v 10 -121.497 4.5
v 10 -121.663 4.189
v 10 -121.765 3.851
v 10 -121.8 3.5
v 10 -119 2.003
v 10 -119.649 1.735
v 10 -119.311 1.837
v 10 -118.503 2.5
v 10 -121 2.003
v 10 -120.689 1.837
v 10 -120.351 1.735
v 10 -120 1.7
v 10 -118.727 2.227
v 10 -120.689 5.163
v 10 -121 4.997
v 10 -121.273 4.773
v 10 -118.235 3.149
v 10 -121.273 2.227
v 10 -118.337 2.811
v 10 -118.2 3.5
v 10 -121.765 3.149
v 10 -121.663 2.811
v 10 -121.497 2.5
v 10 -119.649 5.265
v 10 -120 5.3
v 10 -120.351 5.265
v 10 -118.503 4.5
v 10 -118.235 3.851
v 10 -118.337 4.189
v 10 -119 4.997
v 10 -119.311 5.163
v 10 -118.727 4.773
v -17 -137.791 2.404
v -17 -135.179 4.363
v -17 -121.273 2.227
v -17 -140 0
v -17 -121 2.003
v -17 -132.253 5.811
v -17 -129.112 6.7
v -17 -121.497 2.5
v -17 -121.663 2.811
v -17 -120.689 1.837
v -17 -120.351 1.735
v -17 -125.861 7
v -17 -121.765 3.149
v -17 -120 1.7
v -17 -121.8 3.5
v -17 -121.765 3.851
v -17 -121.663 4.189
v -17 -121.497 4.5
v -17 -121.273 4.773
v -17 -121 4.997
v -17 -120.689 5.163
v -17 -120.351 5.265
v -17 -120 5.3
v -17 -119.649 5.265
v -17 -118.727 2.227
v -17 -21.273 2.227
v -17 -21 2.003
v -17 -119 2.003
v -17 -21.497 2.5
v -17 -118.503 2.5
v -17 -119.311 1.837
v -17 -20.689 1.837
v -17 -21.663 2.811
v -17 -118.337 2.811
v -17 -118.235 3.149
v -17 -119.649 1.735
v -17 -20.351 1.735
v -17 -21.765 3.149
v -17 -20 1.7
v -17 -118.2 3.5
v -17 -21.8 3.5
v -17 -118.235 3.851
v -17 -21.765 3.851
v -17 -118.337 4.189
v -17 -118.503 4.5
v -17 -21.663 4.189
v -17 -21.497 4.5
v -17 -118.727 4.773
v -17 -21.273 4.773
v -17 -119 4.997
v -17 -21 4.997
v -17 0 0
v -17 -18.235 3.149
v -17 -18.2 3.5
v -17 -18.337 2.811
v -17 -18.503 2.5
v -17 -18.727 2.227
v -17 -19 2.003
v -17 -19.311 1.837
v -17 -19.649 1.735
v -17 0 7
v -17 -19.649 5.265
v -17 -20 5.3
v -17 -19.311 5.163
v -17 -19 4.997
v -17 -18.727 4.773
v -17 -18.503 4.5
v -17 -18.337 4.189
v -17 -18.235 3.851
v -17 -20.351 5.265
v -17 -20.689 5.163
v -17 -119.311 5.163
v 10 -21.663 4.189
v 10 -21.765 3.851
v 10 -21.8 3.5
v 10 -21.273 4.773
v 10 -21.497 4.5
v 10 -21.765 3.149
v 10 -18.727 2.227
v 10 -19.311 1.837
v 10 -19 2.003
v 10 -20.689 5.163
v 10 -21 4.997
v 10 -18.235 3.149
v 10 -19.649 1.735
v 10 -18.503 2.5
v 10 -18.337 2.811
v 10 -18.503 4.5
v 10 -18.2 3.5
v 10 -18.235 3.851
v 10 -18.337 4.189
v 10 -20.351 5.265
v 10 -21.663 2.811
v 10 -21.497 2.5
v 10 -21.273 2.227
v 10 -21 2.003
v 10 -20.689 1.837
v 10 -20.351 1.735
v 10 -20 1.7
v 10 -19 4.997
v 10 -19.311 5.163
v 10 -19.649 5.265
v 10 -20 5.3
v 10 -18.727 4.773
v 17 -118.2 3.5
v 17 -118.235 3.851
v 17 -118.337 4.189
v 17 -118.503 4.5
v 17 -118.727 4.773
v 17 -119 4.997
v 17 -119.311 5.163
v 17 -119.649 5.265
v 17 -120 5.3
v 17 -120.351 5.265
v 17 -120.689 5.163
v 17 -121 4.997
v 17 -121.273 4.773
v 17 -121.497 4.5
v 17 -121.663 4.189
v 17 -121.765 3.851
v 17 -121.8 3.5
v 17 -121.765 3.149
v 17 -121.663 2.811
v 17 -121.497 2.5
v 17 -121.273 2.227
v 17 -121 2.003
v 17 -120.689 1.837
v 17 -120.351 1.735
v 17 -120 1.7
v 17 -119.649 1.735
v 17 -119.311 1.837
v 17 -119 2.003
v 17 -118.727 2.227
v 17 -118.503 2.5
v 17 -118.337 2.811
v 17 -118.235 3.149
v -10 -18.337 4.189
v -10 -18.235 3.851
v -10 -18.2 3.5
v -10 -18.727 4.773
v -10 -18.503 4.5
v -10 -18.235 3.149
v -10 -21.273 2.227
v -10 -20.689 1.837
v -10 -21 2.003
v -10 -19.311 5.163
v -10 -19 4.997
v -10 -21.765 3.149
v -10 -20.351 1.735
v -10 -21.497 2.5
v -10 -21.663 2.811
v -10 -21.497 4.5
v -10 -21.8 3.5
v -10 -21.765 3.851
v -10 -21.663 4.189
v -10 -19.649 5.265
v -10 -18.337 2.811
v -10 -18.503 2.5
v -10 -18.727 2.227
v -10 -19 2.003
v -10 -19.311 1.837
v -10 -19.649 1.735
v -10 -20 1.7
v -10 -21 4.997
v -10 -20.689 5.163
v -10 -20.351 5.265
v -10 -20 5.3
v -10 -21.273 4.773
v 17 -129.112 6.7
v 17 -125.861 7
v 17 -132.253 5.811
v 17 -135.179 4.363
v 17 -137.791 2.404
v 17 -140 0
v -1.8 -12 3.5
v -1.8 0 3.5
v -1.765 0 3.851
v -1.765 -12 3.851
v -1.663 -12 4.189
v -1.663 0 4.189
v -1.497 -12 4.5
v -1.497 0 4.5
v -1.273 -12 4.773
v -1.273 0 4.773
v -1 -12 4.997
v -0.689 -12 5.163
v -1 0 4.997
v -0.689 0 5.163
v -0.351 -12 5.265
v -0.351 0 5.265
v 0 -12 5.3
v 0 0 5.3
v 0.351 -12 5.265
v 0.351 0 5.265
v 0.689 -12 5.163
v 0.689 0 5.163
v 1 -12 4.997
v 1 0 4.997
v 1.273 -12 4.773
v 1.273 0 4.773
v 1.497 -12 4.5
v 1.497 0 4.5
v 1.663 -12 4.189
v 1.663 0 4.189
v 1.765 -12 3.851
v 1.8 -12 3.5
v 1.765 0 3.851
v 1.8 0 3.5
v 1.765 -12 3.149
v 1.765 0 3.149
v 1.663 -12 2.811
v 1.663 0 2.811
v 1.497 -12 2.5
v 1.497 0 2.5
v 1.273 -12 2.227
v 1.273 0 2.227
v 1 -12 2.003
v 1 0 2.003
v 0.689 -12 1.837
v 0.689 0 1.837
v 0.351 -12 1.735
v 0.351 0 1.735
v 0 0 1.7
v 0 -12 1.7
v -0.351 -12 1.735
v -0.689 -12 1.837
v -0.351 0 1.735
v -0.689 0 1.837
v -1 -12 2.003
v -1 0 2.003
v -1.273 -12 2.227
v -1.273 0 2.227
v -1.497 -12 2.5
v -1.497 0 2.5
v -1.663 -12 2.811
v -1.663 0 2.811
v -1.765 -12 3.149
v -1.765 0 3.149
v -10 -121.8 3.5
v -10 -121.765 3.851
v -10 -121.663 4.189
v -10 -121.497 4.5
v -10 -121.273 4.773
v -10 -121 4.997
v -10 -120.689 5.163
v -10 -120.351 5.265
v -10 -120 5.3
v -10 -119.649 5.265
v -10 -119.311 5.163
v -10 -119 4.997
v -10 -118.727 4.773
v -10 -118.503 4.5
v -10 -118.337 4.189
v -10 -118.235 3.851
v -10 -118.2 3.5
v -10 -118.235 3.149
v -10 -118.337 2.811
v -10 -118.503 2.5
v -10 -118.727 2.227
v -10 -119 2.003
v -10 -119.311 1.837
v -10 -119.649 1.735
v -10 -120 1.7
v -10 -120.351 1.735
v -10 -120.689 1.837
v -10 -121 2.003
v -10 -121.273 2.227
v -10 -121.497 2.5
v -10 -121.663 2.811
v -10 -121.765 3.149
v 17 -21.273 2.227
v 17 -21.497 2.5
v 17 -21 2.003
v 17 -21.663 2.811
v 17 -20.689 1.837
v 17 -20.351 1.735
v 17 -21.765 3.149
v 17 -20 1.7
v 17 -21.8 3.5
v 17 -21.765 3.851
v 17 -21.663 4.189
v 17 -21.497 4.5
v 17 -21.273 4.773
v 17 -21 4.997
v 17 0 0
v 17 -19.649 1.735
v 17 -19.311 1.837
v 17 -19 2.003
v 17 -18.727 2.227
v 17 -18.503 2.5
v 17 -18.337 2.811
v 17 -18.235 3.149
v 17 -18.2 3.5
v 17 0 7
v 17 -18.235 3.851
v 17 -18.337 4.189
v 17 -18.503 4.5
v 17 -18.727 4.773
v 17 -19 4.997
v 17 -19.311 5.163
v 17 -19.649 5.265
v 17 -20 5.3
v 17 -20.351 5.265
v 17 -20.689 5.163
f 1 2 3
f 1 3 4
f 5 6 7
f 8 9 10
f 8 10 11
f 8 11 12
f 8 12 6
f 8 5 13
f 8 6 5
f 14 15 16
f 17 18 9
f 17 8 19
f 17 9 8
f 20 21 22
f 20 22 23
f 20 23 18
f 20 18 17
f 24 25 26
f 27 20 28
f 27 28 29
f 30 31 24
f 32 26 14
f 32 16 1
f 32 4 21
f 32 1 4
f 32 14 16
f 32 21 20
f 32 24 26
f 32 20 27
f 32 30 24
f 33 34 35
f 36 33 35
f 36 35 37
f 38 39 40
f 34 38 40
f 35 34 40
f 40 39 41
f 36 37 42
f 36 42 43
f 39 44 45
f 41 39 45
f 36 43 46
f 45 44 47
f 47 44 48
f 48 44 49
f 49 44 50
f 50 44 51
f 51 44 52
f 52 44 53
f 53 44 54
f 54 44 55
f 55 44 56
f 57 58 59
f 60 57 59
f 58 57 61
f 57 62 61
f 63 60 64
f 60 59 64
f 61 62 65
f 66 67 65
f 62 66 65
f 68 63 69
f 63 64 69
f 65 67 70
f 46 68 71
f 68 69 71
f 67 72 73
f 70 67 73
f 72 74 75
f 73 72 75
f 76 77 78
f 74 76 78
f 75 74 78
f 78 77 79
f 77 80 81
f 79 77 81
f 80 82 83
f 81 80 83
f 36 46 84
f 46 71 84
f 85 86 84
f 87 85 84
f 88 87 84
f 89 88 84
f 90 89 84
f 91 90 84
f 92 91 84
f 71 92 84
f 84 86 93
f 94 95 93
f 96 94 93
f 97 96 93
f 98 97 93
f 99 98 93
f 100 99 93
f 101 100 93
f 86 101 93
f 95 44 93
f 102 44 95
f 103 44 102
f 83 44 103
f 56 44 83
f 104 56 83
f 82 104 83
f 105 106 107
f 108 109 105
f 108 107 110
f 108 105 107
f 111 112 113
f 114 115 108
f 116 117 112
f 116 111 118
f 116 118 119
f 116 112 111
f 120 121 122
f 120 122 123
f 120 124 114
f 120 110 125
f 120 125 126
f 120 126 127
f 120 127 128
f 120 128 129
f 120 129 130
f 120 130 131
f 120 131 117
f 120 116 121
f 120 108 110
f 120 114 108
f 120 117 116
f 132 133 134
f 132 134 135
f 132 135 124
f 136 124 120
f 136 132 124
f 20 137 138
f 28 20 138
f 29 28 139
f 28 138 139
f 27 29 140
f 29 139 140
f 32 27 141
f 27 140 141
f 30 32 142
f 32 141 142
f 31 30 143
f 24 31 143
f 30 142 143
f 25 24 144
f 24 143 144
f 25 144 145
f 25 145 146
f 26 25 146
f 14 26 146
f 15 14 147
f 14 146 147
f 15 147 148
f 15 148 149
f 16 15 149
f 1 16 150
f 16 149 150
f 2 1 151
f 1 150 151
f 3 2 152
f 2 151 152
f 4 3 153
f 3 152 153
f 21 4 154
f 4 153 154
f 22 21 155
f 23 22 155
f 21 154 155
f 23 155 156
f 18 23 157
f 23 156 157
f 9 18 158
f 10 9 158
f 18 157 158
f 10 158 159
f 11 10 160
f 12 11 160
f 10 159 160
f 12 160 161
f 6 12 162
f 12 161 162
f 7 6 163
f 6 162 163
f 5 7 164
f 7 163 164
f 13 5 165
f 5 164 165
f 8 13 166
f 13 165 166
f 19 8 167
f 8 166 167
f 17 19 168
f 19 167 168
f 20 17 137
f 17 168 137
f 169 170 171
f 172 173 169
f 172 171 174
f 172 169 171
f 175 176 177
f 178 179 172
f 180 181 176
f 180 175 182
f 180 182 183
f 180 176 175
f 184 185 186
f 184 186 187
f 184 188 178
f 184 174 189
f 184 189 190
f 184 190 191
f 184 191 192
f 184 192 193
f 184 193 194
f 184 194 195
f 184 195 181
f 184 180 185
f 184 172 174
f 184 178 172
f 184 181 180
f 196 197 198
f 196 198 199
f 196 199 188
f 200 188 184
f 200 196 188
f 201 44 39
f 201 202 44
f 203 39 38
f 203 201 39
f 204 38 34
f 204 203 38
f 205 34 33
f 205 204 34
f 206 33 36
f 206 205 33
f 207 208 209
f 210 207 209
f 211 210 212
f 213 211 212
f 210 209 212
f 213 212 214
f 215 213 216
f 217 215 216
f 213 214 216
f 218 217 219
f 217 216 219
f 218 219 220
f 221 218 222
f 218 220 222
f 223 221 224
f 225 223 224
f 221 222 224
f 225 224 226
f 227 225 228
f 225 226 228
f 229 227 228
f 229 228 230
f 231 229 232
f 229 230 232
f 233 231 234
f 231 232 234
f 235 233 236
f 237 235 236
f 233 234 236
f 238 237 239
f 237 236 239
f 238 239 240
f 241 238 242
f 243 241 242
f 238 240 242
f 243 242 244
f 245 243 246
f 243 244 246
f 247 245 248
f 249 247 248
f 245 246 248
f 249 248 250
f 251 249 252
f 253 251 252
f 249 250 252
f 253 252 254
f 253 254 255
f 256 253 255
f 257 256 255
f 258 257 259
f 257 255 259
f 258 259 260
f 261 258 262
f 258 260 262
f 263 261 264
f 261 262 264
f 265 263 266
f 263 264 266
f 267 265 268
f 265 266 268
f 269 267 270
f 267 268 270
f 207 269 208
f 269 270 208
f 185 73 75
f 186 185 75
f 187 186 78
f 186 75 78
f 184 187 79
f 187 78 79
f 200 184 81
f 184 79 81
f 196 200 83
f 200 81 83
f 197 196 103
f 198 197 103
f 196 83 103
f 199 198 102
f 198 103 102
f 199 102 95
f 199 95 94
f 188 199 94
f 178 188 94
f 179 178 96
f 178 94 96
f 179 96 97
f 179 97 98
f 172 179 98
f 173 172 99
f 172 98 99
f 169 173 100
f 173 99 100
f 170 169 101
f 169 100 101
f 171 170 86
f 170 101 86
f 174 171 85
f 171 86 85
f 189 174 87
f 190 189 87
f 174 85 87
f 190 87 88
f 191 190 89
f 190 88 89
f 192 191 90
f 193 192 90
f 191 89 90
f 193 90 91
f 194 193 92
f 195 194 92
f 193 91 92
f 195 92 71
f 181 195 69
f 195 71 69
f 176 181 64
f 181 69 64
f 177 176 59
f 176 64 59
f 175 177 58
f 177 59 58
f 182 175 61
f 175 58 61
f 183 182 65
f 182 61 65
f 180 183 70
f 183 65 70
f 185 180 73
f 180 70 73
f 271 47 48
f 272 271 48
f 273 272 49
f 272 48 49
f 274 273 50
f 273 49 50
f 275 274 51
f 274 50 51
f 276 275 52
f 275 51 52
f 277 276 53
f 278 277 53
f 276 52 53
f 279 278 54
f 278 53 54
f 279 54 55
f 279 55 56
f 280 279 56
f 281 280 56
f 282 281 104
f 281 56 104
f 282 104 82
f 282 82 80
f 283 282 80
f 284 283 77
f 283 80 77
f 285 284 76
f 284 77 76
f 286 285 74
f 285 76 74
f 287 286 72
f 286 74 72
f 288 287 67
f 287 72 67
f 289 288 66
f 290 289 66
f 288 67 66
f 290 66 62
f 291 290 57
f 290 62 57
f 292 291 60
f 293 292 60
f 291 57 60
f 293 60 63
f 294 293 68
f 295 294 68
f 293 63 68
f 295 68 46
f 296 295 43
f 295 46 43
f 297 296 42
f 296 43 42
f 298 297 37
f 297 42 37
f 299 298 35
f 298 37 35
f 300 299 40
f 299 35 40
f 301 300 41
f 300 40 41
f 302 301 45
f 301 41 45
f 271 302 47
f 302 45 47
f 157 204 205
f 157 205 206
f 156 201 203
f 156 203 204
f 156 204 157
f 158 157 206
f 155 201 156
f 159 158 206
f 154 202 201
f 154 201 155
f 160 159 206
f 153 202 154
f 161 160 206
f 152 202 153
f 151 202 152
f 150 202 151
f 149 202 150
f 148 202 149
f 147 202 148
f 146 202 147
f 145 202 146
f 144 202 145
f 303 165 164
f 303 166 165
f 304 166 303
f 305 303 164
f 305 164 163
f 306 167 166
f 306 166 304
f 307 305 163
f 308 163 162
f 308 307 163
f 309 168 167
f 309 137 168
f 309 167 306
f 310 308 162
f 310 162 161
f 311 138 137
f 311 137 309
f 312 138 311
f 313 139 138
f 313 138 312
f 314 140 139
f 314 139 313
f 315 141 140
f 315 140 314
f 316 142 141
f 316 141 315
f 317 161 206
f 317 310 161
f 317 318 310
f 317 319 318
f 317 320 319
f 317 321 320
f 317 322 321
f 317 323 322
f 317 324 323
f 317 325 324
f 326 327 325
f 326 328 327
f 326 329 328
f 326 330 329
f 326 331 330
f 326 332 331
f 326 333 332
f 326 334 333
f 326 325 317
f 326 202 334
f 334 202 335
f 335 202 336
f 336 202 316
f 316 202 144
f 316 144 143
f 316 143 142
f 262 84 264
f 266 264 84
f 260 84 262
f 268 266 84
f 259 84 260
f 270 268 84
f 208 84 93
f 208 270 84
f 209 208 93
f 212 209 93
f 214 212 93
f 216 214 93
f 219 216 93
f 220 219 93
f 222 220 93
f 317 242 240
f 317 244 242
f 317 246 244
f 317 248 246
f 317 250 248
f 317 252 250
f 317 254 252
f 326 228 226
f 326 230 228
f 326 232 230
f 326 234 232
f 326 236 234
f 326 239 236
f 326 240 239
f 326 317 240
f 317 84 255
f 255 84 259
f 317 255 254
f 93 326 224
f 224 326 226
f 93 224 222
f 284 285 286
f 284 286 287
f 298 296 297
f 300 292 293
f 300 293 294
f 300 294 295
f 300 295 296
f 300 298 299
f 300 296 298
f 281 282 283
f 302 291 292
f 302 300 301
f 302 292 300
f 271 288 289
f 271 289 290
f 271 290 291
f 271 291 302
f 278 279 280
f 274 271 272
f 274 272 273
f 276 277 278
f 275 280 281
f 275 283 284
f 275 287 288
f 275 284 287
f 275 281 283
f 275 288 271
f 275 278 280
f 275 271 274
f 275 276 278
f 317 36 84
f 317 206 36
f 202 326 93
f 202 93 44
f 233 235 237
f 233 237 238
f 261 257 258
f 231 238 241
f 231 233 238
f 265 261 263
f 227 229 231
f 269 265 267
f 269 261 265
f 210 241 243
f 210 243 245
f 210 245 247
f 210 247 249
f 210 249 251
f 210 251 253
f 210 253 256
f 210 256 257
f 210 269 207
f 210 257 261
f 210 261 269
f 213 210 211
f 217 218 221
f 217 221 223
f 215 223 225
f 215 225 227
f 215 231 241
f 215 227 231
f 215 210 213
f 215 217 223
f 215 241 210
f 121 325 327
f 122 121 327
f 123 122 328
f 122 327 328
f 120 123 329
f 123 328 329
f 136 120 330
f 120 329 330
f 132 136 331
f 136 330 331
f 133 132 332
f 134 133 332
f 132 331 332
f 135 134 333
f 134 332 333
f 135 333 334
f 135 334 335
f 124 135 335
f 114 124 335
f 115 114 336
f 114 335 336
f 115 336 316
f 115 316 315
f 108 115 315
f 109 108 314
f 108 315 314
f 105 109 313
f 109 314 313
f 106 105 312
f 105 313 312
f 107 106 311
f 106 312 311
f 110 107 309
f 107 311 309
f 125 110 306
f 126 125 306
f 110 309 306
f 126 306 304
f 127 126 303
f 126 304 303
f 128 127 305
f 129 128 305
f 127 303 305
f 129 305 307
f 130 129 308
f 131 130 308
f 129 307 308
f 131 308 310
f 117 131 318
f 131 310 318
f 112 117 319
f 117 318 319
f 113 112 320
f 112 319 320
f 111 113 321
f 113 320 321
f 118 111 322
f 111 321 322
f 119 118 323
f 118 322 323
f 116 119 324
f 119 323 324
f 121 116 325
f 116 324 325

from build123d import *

# Parameters (mm, degrees)
F1_DEPTH = 17
F2_R     = 1.8
F3_DEPTH = 7
F4_R     = 1.8
F5_DEPTH = 7
F6_R     = 1.8
F7_DEPTH = 12


with BuildPart() as f1:
    # F0 (on Right) → F1 (new body, symmetric)
    with BuildSketch(Plane.YZ):
        with BuildLine():
            Line((-140, 0), (0, 0))
            Line((0, 0), (0, 7))
            Line((0, 7), (-125.860693, 7))
            ThreePointArc((-125.860693, 7), (-133.749292, 5.15419), (-140, 0))
        make_face()
    extrude(amount=F1_DEPTH, both=True)

    # F2 (on face) → F3 (cut)
    with BuildSketch(Plane.YZ.offset(17)):
        with Locations((-20, 3.5)):
            Circle(F2_R)
        with Locations((-120, 3.5)):
            Circle(F2_R)
    extrude(amount=-F3_DEPTH, mode=Mode.SUBTRACT)

    # F4 (on face) → F5 (cut)
    with BuildSketch(Plane(origin=(-17, 0, 0), x_dir=(0, -1, 0), z_dir=(-1, 0, 0))):
        with Locations((20, 3.5)):
            Circle(F4_R)
        with Locations((120, 3.5)):
            Circle(F4_R)
    extrude(amount=-F5_DEPTH, mode=Mode.SUBTRACT)

    # F6 (on face) → F7 (cut)
    with BuildSketch(Plane(origin=(0, 0, 0), x_dir=(-1, 0, 0), z_dir=(0, 1, 0))):
        with Locations((0, 3.5)):
            Circle(F6_R)
    extrude(amount=-F7_DEPTH, mode=Mode.SUBTRACT)


solid = f1.part
